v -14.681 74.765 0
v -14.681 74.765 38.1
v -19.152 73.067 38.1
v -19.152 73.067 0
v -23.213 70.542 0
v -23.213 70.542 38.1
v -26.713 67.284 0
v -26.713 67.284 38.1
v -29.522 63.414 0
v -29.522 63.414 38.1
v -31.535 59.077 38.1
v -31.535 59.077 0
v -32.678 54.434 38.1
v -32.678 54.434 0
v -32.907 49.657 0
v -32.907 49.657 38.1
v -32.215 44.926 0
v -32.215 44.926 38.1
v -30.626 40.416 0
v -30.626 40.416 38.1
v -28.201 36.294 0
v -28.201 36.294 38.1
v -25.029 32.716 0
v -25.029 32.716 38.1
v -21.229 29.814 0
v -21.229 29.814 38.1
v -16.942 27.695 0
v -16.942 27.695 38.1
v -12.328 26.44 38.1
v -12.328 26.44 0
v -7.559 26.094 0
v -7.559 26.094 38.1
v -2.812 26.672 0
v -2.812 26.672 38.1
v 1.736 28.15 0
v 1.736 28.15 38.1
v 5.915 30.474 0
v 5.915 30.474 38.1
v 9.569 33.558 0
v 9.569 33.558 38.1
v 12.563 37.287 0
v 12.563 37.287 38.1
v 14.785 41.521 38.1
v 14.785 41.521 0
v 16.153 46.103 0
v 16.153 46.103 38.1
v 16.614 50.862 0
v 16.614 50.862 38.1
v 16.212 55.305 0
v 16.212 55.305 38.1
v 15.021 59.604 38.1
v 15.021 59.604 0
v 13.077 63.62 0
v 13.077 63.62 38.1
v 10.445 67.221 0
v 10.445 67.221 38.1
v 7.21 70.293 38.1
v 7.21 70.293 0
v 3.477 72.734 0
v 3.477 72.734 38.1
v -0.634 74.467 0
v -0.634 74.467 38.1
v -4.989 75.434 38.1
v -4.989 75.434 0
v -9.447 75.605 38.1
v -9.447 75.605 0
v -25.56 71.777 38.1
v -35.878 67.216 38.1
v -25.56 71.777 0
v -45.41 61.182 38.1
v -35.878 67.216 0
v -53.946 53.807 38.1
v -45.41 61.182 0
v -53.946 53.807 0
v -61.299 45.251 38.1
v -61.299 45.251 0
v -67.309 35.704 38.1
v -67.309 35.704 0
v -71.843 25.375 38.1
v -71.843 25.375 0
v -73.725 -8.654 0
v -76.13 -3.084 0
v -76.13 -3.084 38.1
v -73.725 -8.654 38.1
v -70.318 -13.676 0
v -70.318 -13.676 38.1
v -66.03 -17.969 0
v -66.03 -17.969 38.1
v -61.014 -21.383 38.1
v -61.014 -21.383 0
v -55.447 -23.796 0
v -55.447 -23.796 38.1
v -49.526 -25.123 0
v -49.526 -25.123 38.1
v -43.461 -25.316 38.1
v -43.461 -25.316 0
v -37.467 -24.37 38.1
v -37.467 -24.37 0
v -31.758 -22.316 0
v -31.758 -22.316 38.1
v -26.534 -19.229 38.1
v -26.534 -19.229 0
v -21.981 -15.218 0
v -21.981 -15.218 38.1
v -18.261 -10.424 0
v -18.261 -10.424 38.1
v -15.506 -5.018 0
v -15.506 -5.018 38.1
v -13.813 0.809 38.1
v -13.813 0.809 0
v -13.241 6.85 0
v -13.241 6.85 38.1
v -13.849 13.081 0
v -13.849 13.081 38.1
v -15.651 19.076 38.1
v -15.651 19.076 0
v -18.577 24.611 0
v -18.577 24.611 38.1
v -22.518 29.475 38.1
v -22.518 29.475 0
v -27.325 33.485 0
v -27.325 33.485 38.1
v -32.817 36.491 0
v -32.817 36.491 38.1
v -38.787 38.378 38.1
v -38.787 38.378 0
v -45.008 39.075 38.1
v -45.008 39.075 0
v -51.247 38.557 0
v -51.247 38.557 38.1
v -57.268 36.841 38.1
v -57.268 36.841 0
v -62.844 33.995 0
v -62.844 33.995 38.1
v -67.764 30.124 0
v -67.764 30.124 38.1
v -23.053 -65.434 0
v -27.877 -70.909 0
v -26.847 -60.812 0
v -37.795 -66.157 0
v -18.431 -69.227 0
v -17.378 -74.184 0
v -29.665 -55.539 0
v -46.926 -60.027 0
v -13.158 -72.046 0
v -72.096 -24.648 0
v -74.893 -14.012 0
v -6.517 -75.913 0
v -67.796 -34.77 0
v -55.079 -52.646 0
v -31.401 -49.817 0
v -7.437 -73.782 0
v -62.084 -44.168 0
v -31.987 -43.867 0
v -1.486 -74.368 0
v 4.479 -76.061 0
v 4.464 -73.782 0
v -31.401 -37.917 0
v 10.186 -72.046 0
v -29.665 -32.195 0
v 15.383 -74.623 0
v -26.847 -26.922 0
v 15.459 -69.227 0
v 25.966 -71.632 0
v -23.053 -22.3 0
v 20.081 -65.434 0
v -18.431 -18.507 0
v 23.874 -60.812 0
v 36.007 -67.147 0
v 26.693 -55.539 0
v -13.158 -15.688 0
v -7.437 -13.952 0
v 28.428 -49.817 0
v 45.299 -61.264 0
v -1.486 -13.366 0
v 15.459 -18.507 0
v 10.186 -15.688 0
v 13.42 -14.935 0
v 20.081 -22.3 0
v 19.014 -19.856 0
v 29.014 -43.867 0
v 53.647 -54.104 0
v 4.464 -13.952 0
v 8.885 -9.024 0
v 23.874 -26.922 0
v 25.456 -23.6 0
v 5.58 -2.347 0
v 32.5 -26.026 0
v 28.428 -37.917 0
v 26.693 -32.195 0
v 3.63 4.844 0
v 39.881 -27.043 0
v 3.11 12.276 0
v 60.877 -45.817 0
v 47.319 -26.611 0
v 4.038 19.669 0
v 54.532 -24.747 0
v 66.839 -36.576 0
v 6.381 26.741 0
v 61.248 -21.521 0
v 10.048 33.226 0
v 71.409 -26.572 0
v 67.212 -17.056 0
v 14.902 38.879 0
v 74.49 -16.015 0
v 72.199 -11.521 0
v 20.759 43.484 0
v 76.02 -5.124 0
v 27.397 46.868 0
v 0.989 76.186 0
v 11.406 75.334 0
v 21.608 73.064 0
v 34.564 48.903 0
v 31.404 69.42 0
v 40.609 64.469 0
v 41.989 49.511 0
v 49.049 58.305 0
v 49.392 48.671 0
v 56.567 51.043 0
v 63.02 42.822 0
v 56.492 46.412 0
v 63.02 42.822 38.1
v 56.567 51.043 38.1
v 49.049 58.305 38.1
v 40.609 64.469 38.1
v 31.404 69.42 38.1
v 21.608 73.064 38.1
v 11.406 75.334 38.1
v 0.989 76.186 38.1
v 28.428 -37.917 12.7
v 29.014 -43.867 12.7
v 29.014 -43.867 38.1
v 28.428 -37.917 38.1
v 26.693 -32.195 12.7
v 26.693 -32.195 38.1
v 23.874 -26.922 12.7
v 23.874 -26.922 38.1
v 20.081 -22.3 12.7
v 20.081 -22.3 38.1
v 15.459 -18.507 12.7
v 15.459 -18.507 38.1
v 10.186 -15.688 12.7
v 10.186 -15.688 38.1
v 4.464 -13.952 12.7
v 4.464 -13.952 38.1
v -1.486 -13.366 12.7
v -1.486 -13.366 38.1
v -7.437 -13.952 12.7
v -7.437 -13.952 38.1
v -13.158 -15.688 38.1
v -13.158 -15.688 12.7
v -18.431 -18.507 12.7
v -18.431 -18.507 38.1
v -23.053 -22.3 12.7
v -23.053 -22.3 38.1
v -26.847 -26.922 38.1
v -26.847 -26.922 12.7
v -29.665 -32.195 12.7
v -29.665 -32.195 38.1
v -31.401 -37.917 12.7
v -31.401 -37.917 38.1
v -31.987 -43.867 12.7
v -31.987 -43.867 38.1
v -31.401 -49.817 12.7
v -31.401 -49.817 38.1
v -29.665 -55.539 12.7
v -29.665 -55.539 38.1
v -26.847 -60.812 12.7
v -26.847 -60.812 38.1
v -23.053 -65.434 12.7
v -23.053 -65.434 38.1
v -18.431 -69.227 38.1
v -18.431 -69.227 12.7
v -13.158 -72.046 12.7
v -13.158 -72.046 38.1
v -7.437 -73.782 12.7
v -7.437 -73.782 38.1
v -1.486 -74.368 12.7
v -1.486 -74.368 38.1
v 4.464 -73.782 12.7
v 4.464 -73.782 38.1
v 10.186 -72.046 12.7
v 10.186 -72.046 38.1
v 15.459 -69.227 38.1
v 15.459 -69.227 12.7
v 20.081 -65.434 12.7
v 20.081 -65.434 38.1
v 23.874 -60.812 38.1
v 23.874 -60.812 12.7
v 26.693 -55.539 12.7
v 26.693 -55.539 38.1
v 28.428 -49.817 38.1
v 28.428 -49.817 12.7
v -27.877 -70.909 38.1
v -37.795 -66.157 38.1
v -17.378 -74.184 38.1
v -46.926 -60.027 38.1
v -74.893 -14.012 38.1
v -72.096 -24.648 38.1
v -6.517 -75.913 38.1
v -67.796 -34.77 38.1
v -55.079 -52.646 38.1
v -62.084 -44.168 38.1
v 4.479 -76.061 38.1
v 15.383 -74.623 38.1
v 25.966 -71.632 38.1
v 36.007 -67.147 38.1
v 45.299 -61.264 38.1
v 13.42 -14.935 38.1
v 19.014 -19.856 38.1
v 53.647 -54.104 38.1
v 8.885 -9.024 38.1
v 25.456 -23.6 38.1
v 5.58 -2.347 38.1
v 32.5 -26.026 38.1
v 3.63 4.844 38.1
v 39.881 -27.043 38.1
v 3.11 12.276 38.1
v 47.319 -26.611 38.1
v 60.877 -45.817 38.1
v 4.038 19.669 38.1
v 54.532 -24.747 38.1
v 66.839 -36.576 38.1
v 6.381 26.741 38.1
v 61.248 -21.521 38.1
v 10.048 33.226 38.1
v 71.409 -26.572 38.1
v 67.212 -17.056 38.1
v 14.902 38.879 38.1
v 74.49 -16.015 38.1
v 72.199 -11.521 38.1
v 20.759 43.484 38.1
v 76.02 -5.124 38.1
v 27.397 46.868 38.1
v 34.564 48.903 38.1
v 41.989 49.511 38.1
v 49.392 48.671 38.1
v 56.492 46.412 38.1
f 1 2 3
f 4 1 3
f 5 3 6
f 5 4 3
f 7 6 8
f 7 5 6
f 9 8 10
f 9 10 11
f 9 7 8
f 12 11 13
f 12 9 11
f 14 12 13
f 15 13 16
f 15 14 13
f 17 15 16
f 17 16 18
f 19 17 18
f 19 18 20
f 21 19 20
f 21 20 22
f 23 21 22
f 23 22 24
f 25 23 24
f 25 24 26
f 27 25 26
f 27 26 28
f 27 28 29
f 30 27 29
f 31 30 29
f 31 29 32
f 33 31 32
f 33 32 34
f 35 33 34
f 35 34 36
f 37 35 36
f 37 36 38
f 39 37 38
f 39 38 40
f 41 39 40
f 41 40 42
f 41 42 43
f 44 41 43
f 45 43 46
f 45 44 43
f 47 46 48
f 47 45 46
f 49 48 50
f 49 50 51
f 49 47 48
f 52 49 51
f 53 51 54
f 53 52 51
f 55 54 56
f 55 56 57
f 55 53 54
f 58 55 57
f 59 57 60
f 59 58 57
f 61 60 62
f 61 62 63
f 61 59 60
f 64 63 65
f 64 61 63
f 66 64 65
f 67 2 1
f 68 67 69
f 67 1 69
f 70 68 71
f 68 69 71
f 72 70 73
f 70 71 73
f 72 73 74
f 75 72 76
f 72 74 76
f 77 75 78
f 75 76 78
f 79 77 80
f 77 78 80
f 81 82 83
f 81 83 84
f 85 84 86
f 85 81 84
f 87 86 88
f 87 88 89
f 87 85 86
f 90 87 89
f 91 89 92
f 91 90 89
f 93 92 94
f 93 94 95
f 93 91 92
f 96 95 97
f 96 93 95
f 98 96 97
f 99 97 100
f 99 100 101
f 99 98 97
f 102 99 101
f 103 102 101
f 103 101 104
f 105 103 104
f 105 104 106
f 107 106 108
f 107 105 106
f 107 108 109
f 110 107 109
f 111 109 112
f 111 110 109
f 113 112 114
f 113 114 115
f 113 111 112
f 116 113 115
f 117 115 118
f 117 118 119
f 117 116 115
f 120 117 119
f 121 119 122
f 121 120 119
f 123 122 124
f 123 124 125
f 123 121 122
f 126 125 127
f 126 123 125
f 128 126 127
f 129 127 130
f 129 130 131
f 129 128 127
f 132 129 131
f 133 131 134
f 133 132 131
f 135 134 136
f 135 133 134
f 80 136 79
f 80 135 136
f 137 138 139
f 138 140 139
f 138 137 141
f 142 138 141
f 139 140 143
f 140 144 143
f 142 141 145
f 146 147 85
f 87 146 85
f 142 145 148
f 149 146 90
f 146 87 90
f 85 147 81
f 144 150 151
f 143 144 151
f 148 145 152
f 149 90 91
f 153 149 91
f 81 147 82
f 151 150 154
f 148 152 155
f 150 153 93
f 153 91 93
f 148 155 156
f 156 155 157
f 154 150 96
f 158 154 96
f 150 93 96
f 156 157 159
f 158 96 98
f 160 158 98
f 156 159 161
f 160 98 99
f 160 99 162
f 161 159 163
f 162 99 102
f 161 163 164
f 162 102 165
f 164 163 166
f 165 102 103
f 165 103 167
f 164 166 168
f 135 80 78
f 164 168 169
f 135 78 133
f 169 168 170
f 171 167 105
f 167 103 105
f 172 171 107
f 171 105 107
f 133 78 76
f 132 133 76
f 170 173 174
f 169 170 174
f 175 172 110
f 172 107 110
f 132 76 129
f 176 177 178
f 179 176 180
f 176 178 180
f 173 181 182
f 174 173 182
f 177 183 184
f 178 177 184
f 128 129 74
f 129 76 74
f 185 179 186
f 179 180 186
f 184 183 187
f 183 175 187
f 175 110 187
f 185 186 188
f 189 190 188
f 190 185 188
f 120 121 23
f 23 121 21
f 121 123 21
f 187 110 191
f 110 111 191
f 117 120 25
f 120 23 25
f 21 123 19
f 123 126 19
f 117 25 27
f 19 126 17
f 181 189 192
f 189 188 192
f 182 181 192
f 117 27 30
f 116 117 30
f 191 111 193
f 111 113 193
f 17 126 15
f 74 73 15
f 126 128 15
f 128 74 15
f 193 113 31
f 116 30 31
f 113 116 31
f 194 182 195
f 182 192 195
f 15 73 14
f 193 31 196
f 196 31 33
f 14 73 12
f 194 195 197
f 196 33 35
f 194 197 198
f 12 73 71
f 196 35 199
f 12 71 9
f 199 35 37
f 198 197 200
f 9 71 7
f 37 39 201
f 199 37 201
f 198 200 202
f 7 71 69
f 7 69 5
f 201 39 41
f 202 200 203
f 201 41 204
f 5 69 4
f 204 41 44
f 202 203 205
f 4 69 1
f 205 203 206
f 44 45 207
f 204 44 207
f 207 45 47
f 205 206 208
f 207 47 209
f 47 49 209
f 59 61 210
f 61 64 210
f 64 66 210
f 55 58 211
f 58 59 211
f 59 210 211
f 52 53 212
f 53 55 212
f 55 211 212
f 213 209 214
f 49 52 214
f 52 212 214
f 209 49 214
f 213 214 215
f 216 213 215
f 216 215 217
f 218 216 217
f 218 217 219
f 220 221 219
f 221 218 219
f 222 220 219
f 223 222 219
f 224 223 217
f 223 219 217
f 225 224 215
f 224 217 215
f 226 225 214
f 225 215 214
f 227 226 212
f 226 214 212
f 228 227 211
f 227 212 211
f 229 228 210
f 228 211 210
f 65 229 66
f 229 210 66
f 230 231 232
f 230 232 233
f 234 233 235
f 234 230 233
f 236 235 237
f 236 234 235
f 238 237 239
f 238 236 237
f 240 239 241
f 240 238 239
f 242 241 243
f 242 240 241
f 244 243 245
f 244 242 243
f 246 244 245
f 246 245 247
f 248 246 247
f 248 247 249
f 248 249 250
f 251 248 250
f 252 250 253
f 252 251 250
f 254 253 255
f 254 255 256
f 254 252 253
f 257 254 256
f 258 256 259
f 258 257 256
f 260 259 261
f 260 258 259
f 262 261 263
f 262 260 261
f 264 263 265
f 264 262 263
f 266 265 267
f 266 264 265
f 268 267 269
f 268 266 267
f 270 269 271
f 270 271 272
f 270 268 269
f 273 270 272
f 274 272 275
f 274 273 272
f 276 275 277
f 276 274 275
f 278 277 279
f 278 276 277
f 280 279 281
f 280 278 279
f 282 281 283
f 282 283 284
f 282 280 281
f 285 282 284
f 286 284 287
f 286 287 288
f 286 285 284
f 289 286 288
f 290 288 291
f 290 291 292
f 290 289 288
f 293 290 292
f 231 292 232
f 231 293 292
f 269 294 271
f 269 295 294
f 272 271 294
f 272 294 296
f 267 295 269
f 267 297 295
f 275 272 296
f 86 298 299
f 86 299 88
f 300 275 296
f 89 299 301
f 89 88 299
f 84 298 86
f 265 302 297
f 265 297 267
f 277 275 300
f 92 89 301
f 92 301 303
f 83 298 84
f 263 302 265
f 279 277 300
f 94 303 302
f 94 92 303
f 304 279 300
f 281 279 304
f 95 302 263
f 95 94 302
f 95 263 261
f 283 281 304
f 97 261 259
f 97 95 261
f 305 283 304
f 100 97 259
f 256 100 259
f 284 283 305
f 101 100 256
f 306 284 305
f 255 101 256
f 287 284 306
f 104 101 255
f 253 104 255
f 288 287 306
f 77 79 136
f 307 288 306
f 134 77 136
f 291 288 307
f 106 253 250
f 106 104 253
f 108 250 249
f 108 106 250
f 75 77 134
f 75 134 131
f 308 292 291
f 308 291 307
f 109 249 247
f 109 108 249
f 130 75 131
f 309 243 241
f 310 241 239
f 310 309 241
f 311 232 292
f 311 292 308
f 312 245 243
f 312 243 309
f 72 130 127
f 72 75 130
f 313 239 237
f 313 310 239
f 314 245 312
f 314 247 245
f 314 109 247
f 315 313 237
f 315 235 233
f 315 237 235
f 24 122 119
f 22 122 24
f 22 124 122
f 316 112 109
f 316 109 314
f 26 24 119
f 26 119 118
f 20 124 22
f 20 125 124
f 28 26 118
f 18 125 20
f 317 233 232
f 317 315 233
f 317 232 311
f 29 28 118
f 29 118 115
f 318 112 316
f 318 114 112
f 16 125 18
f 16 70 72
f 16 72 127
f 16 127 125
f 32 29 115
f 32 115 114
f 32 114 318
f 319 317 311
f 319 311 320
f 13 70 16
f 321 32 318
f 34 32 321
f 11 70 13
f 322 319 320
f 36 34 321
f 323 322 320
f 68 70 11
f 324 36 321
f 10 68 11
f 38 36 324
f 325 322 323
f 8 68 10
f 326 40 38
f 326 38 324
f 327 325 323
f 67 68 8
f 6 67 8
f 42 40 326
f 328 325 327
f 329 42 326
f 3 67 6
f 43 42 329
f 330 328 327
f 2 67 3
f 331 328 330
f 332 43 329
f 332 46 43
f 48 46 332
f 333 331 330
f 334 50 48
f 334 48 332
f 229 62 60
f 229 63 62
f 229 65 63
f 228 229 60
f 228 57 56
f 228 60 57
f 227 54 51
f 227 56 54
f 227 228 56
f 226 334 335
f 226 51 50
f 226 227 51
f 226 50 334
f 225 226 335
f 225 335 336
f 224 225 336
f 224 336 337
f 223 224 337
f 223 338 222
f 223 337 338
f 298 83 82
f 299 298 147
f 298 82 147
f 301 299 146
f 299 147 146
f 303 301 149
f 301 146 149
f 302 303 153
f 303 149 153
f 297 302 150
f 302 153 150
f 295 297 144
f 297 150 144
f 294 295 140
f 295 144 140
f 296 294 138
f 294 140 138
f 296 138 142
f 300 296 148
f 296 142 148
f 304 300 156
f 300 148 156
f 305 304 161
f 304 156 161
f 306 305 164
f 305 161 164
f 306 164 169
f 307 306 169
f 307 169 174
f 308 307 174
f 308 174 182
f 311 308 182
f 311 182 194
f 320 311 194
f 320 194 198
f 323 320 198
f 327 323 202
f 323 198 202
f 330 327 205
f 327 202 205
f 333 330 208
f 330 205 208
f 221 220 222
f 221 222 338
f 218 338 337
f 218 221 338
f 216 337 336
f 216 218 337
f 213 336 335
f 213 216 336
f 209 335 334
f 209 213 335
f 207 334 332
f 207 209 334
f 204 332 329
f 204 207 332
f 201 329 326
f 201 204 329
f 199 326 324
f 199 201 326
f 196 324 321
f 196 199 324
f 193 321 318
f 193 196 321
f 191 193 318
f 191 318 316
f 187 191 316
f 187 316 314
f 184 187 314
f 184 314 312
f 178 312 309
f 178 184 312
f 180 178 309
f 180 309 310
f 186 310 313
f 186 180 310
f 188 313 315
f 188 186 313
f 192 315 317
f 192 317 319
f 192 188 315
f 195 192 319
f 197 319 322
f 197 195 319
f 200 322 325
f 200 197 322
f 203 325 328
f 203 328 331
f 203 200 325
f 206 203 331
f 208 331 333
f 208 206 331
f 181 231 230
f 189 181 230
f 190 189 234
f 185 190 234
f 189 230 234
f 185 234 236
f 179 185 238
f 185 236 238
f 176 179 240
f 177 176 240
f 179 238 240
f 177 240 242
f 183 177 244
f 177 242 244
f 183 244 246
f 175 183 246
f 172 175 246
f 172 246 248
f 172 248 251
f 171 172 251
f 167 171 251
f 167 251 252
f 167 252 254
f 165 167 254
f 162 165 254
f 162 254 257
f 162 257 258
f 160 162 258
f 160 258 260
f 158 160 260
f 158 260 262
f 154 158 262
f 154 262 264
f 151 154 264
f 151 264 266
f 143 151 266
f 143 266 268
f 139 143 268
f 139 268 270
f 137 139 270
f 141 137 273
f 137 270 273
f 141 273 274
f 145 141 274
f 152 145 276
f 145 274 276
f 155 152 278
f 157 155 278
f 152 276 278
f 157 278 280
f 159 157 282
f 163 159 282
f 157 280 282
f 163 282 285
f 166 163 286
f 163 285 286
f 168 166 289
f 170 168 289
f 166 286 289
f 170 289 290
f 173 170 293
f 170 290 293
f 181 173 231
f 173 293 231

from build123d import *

# Parameters (mm, degrees)
F0_R     = 76.1923930789
F1_DEPTH = 12.7
F2_R     = 30.5006565041
F2_R_2   = 1.4862391827
F3_DEPTH = 12.701
F4_DEPTH = 25.4
F5_DEPTH = 25.4
F6_DEPTH = 25.4
F7_DEPTH = 25.4


with BuildPart() as f1:
    # F0 (on Top) → F1 (new body)
    with BuildSketch(Plane.XY):
        Circle(F0_R)
    extrude(amount=F1_DEPTH)

    # F2 (on face) → F3 (cut, through all)
    with BuildSketch(Plane.XY.offset(12.7)):
        with Locations((-1.4862391827, -43.8670478761)):
            Circle(F2_R)
        with Locations((0, -43.8670478761)):
            Circle(F2_R_2, mode=Mode.SUBTRACT)
        with BuildLine():
            ThreePointArc((76.1923930789, 0), (72.8249793386, 22.4009630914), (63.0203918555, 42.8218515884))
            ThreePointArc((63.0203918555, 42.8218515884), (4.4295199426, 1.2009612876), (76.0198799285, -5.1243164166))
            ThreePointArc((76.0198799285, -5.1243164166), (76.1492525781, -2.5636097365), (76.1923930789, 0))
        make_face()
        with BuildLine():
            ThreePointArc((16.6140991318, 50.8624613285), (8.8970664681, 68.830007636), (-9.4466365709, 75.6045092609))
            ThreePointArc((-9.4466365709, 75.6045092609), (-12.0713018803, 75.2300766582), (-14.6813511871, 74.7645550405))
            ThreePointArc((-14.6813511871, 74.7645550405), (-23.1993361612, 31.1729000429), (16.6140991318, 50.8624613285))
        make_face()
        with BuildLine():
            ThreePointArc((-71.8429908792, 25.374503436), (-75.3423273306, 11.349646492), (-76.1299647651, -3.0837036101))
            ThreePointArc((-76.1299647651, -3.0837036101), (-40.4419002943, -24.9844594479), (-13.2413656339, 6.8496726453))
            ThreePointArc((-13.2413656339, 6.8496726453), (-35.7559759242, 37.5796247979), (-71.8429908792, 25.374503436))
        make_face()
        with BuildLine():
            ThreePointArc((-14.6813511871, 74.7645550405), (-12.0713018803, 75.2300766582), (-9.4466365709, 75.6045092609))
            ThreePointArc((-9.4466365709, 75.6045092609), (-12.0865262133, 75.3249568749), (-14.6813511871, 74.7645550405))
        make_face()
        with BuildLine():
            ThreePointArc((-71.8429908792, 25.374503436), (-77.33938953, 11.6504860173), (-76.1299647651, -3.0837036101))
            ThreePointArc((-76.1299647651, -3.0837036101), (-75.3423273306, 11.349646492), (-71.8429908792, 25.374503436))
        make_face()
        with BuildLine():
            ThreePointArc((76.0198799285, -5.1243164166), (78.7566482722, 2.8459379332), (79.6838716591, 11.2218027934))
            ThreePointArc((79.6838716591, 11.2218027934), (75.2627955479, 29.0840160032), (63.0203918555, 42.8218515884))
            ThreePointArc((63.0203918555, 42.8218515884), (72.8249793386, 22.4009630914), (76.1923930789, 0))
            ThreePointArc((76.1923930789, 0), (76.1492525781, -2.5636097365), (76.0198799285, -5.1243164166))
        make_face()
    extrude(amount=-F3_DEPTH, mode=Mode.SUBTRACT)

    # F4 (add): a face of the model
    f4_faces = [f1.faces().sort_by_distance(p)[0] for p in [
        (-2.154905566, -6.975298751, 12.7),
    ]]
    extrude(f4_faces, amount=F4_DEPTH)

    # F5 (cut): a face of the model
    f5_faces = [f1.faces().sort_by_distance(p)[0] for p in [
        (-2.154905566, -6.975298751, 38.1),
    ]]
    extrude(f5_faces, amount=-F5_DEPTH, mode=Mode.SUBTRACT)

    # F6 (cut): a face of the model
    f6_faces = [f1.faces().sort_by_distance(p)[0] for p in [
        (0, -43.8670478761, 12.7),
    ]]
    extrude(f6_faces, amount=-F6_DEPTH, mode=Mode.SUBTRACT)

    # F7 (add): a face of the model
    f7_faces = [f1.faces().sort_by_distance(p)[0] for p in [
        (-2.154905566, -6.975298751, 12.7),
    ]]
    extrude(f7_faces, amount=F7_DEPTH)


solid = f1.part
